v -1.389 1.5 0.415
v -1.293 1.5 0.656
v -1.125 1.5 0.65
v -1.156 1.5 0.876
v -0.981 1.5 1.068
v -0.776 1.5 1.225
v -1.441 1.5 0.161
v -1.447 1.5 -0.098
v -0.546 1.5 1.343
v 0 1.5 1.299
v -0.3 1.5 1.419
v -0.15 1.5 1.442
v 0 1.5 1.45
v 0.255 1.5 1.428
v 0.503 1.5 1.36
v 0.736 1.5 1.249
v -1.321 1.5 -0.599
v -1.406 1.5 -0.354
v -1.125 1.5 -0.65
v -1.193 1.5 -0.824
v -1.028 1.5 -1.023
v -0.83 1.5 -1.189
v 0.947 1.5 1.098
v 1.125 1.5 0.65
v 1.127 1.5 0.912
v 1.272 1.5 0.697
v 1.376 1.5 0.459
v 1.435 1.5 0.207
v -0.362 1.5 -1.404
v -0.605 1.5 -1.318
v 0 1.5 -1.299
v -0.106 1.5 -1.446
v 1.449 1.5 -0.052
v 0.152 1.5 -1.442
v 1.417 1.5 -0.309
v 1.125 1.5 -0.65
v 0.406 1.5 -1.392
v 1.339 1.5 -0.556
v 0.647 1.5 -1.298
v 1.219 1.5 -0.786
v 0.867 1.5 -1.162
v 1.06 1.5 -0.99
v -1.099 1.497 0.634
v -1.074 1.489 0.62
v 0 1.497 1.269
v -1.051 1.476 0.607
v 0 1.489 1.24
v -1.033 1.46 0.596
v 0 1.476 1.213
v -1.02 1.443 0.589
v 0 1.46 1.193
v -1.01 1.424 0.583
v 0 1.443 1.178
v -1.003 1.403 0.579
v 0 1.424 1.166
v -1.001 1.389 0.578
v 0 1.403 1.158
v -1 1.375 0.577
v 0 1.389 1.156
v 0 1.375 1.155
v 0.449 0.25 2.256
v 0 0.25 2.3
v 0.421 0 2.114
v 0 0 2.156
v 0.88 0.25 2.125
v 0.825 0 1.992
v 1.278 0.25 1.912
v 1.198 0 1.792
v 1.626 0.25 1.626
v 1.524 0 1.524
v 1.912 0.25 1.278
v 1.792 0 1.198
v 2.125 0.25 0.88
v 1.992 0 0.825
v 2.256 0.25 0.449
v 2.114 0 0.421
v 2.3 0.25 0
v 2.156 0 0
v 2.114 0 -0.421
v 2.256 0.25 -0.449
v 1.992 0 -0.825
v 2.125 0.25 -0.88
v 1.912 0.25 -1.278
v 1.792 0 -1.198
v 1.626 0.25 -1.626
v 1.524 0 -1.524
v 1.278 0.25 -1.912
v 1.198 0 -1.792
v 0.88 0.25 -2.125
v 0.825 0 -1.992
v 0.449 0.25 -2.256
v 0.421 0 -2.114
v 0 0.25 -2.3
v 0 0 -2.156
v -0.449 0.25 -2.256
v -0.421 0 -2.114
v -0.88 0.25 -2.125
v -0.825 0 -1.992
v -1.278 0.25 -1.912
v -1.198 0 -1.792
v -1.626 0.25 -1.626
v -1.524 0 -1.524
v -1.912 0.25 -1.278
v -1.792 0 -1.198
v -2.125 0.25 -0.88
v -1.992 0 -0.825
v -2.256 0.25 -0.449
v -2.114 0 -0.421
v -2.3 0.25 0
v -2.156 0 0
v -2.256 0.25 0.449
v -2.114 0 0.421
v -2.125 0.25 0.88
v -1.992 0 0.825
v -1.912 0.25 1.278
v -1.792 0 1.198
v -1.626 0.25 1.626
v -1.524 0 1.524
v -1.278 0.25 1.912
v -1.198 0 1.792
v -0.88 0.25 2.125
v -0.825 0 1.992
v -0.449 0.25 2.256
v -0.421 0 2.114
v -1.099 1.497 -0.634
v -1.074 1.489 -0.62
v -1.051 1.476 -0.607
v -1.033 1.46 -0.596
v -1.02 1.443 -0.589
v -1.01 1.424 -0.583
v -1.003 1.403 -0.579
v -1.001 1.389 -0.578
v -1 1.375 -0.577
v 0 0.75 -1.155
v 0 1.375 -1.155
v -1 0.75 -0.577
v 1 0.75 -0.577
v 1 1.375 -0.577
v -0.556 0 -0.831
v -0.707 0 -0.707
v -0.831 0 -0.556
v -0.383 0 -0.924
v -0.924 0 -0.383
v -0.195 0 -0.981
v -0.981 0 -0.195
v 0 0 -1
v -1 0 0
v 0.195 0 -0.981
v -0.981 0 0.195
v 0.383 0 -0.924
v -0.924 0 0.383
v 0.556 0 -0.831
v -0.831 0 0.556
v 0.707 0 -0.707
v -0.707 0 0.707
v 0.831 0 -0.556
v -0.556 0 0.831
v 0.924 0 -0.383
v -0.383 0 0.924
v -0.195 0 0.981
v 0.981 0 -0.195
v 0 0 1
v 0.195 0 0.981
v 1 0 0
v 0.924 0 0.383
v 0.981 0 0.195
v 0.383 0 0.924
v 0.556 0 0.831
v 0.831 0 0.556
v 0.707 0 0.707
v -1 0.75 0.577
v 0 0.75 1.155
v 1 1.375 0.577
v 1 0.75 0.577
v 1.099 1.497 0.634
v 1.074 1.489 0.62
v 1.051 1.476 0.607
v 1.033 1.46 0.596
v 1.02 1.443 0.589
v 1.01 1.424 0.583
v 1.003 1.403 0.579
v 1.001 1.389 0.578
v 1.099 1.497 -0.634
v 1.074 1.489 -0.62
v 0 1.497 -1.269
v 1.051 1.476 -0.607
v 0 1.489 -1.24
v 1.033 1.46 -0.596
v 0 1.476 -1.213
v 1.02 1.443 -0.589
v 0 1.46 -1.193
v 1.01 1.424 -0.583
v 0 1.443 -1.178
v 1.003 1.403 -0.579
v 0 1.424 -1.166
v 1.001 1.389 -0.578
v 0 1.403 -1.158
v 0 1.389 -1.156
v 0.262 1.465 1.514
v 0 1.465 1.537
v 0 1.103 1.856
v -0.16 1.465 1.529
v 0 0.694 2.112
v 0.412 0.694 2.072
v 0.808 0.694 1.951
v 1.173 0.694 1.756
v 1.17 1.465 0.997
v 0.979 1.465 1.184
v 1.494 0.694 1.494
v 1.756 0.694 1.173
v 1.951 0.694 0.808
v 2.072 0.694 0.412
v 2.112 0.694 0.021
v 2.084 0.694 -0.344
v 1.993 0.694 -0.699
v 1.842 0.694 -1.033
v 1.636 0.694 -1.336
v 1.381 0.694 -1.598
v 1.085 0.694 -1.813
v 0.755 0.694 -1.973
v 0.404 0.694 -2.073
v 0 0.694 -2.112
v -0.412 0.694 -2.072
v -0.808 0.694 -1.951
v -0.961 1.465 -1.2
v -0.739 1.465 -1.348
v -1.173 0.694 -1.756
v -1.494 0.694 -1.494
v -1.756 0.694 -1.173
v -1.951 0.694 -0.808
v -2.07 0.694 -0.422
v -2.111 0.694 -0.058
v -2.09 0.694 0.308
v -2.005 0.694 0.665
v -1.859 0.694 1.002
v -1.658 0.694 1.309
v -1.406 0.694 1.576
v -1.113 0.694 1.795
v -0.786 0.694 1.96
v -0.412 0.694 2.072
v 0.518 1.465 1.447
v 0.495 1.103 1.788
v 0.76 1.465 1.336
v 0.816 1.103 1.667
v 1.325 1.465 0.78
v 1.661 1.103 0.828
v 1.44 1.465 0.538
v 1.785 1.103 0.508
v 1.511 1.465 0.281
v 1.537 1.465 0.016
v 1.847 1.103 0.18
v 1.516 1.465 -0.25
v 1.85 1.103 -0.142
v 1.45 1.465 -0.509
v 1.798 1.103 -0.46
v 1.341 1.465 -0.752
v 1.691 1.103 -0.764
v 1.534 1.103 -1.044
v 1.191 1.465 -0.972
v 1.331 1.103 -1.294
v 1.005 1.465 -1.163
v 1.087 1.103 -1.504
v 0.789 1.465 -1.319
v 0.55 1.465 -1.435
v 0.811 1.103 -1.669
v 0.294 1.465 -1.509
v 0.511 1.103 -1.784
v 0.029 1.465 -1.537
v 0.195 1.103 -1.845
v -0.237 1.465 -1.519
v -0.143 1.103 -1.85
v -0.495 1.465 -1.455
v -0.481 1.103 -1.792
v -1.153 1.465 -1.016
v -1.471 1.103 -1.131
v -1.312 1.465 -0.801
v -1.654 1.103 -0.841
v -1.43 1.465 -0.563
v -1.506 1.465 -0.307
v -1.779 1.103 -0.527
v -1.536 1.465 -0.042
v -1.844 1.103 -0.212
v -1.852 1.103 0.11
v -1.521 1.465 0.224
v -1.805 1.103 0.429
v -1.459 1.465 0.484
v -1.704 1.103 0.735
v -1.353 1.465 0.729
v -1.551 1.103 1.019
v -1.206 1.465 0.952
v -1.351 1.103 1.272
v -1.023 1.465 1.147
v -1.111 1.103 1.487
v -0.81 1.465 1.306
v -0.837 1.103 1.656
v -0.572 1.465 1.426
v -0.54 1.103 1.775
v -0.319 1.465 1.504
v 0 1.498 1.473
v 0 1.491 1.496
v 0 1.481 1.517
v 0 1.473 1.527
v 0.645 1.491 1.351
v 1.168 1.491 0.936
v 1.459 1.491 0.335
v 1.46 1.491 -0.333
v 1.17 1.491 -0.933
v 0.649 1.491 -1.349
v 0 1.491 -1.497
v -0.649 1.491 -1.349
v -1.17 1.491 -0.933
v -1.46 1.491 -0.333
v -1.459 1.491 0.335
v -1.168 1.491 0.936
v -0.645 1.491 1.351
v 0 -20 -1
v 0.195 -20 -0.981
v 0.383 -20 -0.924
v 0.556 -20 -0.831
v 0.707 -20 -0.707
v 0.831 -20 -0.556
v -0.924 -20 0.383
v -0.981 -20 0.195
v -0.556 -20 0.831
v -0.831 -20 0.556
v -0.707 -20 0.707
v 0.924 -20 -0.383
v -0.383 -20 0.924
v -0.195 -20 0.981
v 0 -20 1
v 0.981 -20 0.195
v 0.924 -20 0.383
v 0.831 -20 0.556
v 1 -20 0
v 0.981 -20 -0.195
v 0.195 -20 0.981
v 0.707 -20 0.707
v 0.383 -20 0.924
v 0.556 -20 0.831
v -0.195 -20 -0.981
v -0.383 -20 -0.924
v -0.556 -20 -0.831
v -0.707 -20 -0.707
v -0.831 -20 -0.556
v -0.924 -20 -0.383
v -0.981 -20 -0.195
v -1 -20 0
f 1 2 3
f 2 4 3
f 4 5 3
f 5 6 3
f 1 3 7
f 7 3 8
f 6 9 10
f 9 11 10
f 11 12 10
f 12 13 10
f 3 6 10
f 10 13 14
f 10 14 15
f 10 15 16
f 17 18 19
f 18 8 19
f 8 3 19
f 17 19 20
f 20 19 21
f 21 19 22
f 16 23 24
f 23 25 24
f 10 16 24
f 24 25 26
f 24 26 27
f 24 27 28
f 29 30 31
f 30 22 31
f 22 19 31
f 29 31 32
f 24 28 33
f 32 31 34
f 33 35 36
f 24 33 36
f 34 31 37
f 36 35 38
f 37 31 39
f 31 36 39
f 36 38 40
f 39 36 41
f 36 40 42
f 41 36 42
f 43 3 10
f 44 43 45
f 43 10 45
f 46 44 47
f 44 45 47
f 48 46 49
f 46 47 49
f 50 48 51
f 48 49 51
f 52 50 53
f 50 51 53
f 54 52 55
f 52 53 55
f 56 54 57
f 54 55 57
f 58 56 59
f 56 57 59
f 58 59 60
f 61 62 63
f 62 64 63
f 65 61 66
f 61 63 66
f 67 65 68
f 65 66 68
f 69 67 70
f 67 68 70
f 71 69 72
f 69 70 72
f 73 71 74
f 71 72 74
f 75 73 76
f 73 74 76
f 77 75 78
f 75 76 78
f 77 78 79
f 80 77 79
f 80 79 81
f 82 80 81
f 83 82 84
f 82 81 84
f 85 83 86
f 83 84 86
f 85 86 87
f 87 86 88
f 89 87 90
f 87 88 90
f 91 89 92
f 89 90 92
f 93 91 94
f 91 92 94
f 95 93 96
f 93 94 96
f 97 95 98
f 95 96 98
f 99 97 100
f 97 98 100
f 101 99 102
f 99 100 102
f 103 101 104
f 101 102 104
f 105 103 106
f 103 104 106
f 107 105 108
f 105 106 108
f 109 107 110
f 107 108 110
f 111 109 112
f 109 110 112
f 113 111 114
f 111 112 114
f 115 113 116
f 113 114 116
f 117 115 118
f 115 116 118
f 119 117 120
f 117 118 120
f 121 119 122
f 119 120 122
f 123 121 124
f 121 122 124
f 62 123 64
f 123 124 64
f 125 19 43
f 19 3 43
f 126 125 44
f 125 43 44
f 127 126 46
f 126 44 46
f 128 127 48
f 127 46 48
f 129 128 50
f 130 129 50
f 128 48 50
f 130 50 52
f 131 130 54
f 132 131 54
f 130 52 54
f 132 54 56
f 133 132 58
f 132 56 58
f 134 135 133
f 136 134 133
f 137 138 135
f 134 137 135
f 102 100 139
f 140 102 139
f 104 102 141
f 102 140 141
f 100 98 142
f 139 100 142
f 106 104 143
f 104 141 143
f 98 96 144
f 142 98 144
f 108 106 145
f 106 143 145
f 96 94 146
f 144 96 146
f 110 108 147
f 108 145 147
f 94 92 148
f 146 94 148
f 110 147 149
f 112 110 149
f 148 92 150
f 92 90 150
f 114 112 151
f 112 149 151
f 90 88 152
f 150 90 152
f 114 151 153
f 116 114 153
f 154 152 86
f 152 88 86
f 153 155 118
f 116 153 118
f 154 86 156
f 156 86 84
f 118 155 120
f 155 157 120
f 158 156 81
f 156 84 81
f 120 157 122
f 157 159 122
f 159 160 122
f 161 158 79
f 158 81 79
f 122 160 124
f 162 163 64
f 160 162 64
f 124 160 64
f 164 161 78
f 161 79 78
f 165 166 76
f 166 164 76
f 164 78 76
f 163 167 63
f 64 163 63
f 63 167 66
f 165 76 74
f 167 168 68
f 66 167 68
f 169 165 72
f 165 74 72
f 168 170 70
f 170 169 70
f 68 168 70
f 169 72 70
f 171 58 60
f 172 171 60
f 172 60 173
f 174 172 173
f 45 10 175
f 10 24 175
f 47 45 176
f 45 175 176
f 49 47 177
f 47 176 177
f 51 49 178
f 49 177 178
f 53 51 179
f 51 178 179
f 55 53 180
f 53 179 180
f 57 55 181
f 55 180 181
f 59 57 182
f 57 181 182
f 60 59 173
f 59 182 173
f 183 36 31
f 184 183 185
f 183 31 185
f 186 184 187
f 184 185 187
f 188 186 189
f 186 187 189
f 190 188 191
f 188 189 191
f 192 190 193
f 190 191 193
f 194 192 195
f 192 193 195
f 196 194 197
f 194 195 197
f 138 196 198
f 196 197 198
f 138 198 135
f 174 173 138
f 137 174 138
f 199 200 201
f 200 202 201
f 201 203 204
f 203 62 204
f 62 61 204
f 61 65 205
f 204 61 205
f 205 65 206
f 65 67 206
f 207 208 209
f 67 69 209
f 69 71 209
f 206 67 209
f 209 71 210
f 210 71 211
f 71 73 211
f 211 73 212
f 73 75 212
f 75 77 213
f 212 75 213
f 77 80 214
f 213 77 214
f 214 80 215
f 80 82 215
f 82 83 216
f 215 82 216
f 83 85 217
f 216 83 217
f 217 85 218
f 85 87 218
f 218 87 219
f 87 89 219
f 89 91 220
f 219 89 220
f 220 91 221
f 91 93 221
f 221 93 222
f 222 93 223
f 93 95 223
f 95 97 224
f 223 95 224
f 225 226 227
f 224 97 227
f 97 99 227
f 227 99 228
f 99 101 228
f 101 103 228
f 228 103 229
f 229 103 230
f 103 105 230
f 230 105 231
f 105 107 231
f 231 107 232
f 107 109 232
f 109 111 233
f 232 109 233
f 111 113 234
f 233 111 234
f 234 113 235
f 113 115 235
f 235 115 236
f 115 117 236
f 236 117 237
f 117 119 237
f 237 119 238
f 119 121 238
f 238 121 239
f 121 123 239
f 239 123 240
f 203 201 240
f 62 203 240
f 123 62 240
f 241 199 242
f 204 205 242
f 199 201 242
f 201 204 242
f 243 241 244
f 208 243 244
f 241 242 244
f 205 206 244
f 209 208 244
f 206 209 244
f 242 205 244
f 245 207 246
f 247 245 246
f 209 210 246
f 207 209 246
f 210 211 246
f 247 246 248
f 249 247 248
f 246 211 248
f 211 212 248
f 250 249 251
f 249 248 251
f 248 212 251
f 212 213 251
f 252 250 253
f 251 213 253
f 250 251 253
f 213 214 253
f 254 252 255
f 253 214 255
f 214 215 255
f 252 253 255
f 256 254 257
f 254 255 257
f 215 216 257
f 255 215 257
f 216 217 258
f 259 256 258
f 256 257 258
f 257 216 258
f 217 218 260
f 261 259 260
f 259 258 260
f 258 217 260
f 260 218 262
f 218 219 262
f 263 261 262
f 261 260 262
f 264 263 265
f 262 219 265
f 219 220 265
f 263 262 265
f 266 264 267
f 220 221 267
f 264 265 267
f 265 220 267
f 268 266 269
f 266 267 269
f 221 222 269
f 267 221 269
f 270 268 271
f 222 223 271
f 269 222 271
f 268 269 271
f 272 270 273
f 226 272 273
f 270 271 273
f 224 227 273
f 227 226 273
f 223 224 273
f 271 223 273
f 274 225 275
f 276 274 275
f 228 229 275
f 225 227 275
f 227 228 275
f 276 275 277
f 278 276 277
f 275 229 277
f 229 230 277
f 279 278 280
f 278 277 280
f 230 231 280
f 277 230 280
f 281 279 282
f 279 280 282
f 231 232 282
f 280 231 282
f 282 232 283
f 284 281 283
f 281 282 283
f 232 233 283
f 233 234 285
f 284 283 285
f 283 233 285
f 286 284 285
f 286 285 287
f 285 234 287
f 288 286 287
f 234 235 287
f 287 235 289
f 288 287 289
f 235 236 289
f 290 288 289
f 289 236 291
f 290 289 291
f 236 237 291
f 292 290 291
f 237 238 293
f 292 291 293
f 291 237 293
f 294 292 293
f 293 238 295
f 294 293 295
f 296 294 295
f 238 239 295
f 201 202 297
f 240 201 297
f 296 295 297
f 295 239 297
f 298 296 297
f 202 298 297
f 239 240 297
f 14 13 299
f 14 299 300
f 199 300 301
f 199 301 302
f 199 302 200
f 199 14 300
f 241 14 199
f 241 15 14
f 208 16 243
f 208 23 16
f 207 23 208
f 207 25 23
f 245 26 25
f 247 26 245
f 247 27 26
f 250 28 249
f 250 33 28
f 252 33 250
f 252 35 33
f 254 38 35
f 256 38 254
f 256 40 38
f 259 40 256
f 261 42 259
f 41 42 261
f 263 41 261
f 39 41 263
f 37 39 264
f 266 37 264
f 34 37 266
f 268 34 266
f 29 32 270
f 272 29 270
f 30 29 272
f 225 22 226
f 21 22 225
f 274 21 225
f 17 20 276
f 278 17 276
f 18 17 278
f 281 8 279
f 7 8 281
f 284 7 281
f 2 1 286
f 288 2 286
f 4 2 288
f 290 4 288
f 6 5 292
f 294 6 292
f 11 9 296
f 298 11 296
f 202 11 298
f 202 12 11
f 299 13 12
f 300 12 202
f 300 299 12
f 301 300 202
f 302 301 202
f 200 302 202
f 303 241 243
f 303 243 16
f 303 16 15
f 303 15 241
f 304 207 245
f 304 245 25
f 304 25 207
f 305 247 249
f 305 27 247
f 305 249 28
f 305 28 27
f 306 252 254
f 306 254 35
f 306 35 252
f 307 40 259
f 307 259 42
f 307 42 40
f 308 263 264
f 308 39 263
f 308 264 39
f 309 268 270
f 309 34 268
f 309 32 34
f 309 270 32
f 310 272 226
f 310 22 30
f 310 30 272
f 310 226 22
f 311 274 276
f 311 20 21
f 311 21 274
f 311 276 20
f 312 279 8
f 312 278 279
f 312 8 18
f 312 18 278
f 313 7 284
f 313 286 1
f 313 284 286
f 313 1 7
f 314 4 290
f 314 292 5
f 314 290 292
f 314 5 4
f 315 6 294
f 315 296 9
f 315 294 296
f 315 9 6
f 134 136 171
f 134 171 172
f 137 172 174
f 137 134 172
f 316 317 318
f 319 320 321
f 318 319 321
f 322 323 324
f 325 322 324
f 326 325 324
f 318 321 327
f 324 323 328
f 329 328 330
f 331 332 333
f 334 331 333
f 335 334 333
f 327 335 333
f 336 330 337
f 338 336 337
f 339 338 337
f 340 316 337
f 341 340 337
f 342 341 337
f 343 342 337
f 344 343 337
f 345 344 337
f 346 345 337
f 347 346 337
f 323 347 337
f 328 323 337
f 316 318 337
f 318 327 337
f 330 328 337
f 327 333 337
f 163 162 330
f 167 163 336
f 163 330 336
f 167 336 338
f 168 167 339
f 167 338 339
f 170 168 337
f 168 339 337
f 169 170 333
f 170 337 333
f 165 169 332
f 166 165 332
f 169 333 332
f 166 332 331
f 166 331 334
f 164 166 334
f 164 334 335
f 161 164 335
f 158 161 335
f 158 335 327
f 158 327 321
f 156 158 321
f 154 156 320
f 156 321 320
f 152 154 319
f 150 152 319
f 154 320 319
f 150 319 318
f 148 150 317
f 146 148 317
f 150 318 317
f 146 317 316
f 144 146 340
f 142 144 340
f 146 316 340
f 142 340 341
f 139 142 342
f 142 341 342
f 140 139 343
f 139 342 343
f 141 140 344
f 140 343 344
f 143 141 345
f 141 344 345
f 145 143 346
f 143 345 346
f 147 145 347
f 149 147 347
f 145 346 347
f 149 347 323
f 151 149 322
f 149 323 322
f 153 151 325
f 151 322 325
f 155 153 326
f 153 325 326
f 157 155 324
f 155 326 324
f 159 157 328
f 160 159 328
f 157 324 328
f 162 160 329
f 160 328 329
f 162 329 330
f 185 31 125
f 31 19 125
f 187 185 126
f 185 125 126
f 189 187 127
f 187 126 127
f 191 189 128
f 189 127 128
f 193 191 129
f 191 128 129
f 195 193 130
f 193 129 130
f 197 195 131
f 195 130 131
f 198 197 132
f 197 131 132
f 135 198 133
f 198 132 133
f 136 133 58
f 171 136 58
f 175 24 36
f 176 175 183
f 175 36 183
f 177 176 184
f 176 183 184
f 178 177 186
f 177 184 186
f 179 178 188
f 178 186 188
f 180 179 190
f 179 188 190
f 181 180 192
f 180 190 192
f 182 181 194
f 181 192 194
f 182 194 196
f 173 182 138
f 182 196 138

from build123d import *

# Parameters (mm, degrees)
CUT_EXTRUDE1_DEPTH = 0.75
FILLET1_R          = 0.125


with BuildPart() as part:
    # Sketch1 → Revolve1 (revolve)
    with BuildSketch(Plane(origin=(0, 0, 0), x_dir=(0, 0, -1), z_dir=(1, 0, 0))):
        with BuildLine():
            Line((0, 1.5), (-1.5, 1.5))
            ThreePointArc((-1.5, 1.5), (-1.978515811, 0.925250119), (-2.3, 0.25))
            Line((-2.3, 0.25), (-2.155662433, 0))
            Line((-2.155662433, 0), (-1, 0))
            Line((-1, 0), (-1, -20))
            Line((-1, -20), (0, -20))
            Line((0, -20), (0, 1.5))
        make_face()
    revolve(axis=Axis((0, -20, 0), (0, 1, 0)))

    # Sketch2 → Cut-Extrude1 (cut)
    with BuildSketch(Plane(origin=(0, 1.5, 0), x_dir=(1, 0, 0), z_dir=(0, 1, 0))):
        Polygon((0, 1.154700538), (-1, 0.577350269), (-1, -0.577350269), (0, -1.154700538), (1, -0.577350269), (1, 0.577350269), align=None)
    extrude(amount=-CUT_EXTRUDE1_DEPTH, mode=Mode.SUBTRACT)

    # Fillet1
    fillet1_edges = [part.edges().sort_by_distance(p)[0] for p in [
        (0.5, 1.5, -0.866025404),
        (-0.5, 1.5, -0.866025404),
        (-1, 1.5, 0),
        (-0.5, 1.5, 0.866025404),
        (0.5, 1.5, 0.866025404),
        (1, 1.5, 0),
        (0, 1.5, -1.5),
    ]]
    fillet(fillet1_edges, radius=FILLET1_R)


solid = part.part
